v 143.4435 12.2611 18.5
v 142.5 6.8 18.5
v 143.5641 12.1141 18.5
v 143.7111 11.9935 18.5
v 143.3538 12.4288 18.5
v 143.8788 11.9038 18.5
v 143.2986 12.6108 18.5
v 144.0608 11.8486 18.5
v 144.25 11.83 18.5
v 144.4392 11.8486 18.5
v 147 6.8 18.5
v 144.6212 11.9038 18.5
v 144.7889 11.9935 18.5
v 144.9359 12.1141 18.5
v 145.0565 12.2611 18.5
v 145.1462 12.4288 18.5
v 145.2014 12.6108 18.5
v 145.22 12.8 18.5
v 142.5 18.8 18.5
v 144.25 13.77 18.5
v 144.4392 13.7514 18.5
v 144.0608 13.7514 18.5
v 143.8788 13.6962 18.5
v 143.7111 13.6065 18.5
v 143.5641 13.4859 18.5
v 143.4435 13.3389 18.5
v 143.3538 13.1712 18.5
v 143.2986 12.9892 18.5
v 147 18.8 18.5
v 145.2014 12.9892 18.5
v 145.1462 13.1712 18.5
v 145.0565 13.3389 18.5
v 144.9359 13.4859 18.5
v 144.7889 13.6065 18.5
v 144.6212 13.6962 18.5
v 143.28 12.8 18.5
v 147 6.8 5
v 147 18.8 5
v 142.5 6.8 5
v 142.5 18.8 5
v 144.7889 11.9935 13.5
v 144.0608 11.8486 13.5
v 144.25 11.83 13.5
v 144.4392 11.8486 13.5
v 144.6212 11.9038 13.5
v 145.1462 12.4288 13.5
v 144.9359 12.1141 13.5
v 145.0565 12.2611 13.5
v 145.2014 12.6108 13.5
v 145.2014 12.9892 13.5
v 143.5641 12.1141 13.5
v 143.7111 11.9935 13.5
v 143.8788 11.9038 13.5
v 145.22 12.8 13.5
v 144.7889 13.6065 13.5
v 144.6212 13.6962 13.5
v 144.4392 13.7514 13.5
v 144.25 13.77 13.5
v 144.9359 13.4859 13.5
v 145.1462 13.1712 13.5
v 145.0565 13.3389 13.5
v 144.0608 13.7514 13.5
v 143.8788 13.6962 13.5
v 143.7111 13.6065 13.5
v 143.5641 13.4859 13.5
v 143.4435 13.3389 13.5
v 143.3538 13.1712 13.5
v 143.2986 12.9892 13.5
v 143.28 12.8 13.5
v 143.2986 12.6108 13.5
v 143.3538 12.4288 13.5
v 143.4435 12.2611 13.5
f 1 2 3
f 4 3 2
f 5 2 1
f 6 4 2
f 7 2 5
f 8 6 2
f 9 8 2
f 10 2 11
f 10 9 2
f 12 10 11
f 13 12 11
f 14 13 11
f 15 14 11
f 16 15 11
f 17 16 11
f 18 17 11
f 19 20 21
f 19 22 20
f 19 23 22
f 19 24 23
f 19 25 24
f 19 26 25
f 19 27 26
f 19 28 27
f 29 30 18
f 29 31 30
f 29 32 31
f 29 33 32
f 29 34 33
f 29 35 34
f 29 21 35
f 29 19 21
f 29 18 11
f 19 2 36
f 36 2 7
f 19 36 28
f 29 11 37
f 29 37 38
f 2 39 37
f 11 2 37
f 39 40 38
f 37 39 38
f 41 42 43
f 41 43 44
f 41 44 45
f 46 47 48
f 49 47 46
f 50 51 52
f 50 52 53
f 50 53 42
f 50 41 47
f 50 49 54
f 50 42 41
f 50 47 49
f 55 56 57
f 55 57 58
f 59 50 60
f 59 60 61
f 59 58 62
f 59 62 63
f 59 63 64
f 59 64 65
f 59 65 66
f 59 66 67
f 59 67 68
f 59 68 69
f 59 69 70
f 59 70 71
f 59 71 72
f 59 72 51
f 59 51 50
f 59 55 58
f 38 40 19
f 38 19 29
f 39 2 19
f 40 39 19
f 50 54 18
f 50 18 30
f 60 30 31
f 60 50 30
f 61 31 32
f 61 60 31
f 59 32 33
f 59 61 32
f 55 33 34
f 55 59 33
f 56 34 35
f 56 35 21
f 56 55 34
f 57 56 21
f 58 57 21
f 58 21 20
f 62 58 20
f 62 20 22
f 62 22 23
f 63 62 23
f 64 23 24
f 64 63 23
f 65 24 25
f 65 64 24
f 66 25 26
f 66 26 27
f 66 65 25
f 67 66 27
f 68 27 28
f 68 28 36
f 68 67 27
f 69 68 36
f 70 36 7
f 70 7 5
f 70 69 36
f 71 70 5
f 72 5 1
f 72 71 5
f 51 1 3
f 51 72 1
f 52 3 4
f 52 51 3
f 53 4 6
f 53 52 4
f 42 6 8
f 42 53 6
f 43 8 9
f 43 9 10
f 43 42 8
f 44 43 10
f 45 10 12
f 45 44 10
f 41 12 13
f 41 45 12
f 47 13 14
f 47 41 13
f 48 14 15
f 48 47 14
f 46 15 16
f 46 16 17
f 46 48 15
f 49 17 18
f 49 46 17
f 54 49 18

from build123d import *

# Parameters (mm, degrees)
CYLINDER002002001001001001001001008_R     = 0.97
CYLINDER002002001001001001001001008_DEPTH = 5
BOX006_W                                  = 4.5
BOX006_H                                  = 12
BOX006_DEPTH                              = 13.5


with BuildPart() as cylinder002002001001001001001001008:
    # Cylinder002002001001001001001001008 → Cylinder002002001001001001001001008 (new body)
    with BuildSketch(Plane(origin=(144.25, 12.8, 13.5), x_dir=(1, 0, 0), z_dir=(0, 0, 1))):
        Circle(CYLINDER002002001001001001001001008_R)
    extrude(amount=CYLINDER002002001001001001001001008_DEPTH)


with BuildPart() as cut013003021:
    # Box006 → Box006 (new body)
    with BuildSketch(Plane(origin=(142.5, 6.8, 5), x_dir=(1, 0, 0), z_dir=(0, 0, 1))):
        with Locations((2.25, 6)):
            Rectangle(BOX006_W, BOX006_H)
    extrude(amount=BOX006_DEPTH)

    # Cut013003021: cut Cylinder002002001001001001001001008
    add(cylinder002002001001001001001001008.part, mode=Mode.SUBTRACT)


solid = cut013003021.part
